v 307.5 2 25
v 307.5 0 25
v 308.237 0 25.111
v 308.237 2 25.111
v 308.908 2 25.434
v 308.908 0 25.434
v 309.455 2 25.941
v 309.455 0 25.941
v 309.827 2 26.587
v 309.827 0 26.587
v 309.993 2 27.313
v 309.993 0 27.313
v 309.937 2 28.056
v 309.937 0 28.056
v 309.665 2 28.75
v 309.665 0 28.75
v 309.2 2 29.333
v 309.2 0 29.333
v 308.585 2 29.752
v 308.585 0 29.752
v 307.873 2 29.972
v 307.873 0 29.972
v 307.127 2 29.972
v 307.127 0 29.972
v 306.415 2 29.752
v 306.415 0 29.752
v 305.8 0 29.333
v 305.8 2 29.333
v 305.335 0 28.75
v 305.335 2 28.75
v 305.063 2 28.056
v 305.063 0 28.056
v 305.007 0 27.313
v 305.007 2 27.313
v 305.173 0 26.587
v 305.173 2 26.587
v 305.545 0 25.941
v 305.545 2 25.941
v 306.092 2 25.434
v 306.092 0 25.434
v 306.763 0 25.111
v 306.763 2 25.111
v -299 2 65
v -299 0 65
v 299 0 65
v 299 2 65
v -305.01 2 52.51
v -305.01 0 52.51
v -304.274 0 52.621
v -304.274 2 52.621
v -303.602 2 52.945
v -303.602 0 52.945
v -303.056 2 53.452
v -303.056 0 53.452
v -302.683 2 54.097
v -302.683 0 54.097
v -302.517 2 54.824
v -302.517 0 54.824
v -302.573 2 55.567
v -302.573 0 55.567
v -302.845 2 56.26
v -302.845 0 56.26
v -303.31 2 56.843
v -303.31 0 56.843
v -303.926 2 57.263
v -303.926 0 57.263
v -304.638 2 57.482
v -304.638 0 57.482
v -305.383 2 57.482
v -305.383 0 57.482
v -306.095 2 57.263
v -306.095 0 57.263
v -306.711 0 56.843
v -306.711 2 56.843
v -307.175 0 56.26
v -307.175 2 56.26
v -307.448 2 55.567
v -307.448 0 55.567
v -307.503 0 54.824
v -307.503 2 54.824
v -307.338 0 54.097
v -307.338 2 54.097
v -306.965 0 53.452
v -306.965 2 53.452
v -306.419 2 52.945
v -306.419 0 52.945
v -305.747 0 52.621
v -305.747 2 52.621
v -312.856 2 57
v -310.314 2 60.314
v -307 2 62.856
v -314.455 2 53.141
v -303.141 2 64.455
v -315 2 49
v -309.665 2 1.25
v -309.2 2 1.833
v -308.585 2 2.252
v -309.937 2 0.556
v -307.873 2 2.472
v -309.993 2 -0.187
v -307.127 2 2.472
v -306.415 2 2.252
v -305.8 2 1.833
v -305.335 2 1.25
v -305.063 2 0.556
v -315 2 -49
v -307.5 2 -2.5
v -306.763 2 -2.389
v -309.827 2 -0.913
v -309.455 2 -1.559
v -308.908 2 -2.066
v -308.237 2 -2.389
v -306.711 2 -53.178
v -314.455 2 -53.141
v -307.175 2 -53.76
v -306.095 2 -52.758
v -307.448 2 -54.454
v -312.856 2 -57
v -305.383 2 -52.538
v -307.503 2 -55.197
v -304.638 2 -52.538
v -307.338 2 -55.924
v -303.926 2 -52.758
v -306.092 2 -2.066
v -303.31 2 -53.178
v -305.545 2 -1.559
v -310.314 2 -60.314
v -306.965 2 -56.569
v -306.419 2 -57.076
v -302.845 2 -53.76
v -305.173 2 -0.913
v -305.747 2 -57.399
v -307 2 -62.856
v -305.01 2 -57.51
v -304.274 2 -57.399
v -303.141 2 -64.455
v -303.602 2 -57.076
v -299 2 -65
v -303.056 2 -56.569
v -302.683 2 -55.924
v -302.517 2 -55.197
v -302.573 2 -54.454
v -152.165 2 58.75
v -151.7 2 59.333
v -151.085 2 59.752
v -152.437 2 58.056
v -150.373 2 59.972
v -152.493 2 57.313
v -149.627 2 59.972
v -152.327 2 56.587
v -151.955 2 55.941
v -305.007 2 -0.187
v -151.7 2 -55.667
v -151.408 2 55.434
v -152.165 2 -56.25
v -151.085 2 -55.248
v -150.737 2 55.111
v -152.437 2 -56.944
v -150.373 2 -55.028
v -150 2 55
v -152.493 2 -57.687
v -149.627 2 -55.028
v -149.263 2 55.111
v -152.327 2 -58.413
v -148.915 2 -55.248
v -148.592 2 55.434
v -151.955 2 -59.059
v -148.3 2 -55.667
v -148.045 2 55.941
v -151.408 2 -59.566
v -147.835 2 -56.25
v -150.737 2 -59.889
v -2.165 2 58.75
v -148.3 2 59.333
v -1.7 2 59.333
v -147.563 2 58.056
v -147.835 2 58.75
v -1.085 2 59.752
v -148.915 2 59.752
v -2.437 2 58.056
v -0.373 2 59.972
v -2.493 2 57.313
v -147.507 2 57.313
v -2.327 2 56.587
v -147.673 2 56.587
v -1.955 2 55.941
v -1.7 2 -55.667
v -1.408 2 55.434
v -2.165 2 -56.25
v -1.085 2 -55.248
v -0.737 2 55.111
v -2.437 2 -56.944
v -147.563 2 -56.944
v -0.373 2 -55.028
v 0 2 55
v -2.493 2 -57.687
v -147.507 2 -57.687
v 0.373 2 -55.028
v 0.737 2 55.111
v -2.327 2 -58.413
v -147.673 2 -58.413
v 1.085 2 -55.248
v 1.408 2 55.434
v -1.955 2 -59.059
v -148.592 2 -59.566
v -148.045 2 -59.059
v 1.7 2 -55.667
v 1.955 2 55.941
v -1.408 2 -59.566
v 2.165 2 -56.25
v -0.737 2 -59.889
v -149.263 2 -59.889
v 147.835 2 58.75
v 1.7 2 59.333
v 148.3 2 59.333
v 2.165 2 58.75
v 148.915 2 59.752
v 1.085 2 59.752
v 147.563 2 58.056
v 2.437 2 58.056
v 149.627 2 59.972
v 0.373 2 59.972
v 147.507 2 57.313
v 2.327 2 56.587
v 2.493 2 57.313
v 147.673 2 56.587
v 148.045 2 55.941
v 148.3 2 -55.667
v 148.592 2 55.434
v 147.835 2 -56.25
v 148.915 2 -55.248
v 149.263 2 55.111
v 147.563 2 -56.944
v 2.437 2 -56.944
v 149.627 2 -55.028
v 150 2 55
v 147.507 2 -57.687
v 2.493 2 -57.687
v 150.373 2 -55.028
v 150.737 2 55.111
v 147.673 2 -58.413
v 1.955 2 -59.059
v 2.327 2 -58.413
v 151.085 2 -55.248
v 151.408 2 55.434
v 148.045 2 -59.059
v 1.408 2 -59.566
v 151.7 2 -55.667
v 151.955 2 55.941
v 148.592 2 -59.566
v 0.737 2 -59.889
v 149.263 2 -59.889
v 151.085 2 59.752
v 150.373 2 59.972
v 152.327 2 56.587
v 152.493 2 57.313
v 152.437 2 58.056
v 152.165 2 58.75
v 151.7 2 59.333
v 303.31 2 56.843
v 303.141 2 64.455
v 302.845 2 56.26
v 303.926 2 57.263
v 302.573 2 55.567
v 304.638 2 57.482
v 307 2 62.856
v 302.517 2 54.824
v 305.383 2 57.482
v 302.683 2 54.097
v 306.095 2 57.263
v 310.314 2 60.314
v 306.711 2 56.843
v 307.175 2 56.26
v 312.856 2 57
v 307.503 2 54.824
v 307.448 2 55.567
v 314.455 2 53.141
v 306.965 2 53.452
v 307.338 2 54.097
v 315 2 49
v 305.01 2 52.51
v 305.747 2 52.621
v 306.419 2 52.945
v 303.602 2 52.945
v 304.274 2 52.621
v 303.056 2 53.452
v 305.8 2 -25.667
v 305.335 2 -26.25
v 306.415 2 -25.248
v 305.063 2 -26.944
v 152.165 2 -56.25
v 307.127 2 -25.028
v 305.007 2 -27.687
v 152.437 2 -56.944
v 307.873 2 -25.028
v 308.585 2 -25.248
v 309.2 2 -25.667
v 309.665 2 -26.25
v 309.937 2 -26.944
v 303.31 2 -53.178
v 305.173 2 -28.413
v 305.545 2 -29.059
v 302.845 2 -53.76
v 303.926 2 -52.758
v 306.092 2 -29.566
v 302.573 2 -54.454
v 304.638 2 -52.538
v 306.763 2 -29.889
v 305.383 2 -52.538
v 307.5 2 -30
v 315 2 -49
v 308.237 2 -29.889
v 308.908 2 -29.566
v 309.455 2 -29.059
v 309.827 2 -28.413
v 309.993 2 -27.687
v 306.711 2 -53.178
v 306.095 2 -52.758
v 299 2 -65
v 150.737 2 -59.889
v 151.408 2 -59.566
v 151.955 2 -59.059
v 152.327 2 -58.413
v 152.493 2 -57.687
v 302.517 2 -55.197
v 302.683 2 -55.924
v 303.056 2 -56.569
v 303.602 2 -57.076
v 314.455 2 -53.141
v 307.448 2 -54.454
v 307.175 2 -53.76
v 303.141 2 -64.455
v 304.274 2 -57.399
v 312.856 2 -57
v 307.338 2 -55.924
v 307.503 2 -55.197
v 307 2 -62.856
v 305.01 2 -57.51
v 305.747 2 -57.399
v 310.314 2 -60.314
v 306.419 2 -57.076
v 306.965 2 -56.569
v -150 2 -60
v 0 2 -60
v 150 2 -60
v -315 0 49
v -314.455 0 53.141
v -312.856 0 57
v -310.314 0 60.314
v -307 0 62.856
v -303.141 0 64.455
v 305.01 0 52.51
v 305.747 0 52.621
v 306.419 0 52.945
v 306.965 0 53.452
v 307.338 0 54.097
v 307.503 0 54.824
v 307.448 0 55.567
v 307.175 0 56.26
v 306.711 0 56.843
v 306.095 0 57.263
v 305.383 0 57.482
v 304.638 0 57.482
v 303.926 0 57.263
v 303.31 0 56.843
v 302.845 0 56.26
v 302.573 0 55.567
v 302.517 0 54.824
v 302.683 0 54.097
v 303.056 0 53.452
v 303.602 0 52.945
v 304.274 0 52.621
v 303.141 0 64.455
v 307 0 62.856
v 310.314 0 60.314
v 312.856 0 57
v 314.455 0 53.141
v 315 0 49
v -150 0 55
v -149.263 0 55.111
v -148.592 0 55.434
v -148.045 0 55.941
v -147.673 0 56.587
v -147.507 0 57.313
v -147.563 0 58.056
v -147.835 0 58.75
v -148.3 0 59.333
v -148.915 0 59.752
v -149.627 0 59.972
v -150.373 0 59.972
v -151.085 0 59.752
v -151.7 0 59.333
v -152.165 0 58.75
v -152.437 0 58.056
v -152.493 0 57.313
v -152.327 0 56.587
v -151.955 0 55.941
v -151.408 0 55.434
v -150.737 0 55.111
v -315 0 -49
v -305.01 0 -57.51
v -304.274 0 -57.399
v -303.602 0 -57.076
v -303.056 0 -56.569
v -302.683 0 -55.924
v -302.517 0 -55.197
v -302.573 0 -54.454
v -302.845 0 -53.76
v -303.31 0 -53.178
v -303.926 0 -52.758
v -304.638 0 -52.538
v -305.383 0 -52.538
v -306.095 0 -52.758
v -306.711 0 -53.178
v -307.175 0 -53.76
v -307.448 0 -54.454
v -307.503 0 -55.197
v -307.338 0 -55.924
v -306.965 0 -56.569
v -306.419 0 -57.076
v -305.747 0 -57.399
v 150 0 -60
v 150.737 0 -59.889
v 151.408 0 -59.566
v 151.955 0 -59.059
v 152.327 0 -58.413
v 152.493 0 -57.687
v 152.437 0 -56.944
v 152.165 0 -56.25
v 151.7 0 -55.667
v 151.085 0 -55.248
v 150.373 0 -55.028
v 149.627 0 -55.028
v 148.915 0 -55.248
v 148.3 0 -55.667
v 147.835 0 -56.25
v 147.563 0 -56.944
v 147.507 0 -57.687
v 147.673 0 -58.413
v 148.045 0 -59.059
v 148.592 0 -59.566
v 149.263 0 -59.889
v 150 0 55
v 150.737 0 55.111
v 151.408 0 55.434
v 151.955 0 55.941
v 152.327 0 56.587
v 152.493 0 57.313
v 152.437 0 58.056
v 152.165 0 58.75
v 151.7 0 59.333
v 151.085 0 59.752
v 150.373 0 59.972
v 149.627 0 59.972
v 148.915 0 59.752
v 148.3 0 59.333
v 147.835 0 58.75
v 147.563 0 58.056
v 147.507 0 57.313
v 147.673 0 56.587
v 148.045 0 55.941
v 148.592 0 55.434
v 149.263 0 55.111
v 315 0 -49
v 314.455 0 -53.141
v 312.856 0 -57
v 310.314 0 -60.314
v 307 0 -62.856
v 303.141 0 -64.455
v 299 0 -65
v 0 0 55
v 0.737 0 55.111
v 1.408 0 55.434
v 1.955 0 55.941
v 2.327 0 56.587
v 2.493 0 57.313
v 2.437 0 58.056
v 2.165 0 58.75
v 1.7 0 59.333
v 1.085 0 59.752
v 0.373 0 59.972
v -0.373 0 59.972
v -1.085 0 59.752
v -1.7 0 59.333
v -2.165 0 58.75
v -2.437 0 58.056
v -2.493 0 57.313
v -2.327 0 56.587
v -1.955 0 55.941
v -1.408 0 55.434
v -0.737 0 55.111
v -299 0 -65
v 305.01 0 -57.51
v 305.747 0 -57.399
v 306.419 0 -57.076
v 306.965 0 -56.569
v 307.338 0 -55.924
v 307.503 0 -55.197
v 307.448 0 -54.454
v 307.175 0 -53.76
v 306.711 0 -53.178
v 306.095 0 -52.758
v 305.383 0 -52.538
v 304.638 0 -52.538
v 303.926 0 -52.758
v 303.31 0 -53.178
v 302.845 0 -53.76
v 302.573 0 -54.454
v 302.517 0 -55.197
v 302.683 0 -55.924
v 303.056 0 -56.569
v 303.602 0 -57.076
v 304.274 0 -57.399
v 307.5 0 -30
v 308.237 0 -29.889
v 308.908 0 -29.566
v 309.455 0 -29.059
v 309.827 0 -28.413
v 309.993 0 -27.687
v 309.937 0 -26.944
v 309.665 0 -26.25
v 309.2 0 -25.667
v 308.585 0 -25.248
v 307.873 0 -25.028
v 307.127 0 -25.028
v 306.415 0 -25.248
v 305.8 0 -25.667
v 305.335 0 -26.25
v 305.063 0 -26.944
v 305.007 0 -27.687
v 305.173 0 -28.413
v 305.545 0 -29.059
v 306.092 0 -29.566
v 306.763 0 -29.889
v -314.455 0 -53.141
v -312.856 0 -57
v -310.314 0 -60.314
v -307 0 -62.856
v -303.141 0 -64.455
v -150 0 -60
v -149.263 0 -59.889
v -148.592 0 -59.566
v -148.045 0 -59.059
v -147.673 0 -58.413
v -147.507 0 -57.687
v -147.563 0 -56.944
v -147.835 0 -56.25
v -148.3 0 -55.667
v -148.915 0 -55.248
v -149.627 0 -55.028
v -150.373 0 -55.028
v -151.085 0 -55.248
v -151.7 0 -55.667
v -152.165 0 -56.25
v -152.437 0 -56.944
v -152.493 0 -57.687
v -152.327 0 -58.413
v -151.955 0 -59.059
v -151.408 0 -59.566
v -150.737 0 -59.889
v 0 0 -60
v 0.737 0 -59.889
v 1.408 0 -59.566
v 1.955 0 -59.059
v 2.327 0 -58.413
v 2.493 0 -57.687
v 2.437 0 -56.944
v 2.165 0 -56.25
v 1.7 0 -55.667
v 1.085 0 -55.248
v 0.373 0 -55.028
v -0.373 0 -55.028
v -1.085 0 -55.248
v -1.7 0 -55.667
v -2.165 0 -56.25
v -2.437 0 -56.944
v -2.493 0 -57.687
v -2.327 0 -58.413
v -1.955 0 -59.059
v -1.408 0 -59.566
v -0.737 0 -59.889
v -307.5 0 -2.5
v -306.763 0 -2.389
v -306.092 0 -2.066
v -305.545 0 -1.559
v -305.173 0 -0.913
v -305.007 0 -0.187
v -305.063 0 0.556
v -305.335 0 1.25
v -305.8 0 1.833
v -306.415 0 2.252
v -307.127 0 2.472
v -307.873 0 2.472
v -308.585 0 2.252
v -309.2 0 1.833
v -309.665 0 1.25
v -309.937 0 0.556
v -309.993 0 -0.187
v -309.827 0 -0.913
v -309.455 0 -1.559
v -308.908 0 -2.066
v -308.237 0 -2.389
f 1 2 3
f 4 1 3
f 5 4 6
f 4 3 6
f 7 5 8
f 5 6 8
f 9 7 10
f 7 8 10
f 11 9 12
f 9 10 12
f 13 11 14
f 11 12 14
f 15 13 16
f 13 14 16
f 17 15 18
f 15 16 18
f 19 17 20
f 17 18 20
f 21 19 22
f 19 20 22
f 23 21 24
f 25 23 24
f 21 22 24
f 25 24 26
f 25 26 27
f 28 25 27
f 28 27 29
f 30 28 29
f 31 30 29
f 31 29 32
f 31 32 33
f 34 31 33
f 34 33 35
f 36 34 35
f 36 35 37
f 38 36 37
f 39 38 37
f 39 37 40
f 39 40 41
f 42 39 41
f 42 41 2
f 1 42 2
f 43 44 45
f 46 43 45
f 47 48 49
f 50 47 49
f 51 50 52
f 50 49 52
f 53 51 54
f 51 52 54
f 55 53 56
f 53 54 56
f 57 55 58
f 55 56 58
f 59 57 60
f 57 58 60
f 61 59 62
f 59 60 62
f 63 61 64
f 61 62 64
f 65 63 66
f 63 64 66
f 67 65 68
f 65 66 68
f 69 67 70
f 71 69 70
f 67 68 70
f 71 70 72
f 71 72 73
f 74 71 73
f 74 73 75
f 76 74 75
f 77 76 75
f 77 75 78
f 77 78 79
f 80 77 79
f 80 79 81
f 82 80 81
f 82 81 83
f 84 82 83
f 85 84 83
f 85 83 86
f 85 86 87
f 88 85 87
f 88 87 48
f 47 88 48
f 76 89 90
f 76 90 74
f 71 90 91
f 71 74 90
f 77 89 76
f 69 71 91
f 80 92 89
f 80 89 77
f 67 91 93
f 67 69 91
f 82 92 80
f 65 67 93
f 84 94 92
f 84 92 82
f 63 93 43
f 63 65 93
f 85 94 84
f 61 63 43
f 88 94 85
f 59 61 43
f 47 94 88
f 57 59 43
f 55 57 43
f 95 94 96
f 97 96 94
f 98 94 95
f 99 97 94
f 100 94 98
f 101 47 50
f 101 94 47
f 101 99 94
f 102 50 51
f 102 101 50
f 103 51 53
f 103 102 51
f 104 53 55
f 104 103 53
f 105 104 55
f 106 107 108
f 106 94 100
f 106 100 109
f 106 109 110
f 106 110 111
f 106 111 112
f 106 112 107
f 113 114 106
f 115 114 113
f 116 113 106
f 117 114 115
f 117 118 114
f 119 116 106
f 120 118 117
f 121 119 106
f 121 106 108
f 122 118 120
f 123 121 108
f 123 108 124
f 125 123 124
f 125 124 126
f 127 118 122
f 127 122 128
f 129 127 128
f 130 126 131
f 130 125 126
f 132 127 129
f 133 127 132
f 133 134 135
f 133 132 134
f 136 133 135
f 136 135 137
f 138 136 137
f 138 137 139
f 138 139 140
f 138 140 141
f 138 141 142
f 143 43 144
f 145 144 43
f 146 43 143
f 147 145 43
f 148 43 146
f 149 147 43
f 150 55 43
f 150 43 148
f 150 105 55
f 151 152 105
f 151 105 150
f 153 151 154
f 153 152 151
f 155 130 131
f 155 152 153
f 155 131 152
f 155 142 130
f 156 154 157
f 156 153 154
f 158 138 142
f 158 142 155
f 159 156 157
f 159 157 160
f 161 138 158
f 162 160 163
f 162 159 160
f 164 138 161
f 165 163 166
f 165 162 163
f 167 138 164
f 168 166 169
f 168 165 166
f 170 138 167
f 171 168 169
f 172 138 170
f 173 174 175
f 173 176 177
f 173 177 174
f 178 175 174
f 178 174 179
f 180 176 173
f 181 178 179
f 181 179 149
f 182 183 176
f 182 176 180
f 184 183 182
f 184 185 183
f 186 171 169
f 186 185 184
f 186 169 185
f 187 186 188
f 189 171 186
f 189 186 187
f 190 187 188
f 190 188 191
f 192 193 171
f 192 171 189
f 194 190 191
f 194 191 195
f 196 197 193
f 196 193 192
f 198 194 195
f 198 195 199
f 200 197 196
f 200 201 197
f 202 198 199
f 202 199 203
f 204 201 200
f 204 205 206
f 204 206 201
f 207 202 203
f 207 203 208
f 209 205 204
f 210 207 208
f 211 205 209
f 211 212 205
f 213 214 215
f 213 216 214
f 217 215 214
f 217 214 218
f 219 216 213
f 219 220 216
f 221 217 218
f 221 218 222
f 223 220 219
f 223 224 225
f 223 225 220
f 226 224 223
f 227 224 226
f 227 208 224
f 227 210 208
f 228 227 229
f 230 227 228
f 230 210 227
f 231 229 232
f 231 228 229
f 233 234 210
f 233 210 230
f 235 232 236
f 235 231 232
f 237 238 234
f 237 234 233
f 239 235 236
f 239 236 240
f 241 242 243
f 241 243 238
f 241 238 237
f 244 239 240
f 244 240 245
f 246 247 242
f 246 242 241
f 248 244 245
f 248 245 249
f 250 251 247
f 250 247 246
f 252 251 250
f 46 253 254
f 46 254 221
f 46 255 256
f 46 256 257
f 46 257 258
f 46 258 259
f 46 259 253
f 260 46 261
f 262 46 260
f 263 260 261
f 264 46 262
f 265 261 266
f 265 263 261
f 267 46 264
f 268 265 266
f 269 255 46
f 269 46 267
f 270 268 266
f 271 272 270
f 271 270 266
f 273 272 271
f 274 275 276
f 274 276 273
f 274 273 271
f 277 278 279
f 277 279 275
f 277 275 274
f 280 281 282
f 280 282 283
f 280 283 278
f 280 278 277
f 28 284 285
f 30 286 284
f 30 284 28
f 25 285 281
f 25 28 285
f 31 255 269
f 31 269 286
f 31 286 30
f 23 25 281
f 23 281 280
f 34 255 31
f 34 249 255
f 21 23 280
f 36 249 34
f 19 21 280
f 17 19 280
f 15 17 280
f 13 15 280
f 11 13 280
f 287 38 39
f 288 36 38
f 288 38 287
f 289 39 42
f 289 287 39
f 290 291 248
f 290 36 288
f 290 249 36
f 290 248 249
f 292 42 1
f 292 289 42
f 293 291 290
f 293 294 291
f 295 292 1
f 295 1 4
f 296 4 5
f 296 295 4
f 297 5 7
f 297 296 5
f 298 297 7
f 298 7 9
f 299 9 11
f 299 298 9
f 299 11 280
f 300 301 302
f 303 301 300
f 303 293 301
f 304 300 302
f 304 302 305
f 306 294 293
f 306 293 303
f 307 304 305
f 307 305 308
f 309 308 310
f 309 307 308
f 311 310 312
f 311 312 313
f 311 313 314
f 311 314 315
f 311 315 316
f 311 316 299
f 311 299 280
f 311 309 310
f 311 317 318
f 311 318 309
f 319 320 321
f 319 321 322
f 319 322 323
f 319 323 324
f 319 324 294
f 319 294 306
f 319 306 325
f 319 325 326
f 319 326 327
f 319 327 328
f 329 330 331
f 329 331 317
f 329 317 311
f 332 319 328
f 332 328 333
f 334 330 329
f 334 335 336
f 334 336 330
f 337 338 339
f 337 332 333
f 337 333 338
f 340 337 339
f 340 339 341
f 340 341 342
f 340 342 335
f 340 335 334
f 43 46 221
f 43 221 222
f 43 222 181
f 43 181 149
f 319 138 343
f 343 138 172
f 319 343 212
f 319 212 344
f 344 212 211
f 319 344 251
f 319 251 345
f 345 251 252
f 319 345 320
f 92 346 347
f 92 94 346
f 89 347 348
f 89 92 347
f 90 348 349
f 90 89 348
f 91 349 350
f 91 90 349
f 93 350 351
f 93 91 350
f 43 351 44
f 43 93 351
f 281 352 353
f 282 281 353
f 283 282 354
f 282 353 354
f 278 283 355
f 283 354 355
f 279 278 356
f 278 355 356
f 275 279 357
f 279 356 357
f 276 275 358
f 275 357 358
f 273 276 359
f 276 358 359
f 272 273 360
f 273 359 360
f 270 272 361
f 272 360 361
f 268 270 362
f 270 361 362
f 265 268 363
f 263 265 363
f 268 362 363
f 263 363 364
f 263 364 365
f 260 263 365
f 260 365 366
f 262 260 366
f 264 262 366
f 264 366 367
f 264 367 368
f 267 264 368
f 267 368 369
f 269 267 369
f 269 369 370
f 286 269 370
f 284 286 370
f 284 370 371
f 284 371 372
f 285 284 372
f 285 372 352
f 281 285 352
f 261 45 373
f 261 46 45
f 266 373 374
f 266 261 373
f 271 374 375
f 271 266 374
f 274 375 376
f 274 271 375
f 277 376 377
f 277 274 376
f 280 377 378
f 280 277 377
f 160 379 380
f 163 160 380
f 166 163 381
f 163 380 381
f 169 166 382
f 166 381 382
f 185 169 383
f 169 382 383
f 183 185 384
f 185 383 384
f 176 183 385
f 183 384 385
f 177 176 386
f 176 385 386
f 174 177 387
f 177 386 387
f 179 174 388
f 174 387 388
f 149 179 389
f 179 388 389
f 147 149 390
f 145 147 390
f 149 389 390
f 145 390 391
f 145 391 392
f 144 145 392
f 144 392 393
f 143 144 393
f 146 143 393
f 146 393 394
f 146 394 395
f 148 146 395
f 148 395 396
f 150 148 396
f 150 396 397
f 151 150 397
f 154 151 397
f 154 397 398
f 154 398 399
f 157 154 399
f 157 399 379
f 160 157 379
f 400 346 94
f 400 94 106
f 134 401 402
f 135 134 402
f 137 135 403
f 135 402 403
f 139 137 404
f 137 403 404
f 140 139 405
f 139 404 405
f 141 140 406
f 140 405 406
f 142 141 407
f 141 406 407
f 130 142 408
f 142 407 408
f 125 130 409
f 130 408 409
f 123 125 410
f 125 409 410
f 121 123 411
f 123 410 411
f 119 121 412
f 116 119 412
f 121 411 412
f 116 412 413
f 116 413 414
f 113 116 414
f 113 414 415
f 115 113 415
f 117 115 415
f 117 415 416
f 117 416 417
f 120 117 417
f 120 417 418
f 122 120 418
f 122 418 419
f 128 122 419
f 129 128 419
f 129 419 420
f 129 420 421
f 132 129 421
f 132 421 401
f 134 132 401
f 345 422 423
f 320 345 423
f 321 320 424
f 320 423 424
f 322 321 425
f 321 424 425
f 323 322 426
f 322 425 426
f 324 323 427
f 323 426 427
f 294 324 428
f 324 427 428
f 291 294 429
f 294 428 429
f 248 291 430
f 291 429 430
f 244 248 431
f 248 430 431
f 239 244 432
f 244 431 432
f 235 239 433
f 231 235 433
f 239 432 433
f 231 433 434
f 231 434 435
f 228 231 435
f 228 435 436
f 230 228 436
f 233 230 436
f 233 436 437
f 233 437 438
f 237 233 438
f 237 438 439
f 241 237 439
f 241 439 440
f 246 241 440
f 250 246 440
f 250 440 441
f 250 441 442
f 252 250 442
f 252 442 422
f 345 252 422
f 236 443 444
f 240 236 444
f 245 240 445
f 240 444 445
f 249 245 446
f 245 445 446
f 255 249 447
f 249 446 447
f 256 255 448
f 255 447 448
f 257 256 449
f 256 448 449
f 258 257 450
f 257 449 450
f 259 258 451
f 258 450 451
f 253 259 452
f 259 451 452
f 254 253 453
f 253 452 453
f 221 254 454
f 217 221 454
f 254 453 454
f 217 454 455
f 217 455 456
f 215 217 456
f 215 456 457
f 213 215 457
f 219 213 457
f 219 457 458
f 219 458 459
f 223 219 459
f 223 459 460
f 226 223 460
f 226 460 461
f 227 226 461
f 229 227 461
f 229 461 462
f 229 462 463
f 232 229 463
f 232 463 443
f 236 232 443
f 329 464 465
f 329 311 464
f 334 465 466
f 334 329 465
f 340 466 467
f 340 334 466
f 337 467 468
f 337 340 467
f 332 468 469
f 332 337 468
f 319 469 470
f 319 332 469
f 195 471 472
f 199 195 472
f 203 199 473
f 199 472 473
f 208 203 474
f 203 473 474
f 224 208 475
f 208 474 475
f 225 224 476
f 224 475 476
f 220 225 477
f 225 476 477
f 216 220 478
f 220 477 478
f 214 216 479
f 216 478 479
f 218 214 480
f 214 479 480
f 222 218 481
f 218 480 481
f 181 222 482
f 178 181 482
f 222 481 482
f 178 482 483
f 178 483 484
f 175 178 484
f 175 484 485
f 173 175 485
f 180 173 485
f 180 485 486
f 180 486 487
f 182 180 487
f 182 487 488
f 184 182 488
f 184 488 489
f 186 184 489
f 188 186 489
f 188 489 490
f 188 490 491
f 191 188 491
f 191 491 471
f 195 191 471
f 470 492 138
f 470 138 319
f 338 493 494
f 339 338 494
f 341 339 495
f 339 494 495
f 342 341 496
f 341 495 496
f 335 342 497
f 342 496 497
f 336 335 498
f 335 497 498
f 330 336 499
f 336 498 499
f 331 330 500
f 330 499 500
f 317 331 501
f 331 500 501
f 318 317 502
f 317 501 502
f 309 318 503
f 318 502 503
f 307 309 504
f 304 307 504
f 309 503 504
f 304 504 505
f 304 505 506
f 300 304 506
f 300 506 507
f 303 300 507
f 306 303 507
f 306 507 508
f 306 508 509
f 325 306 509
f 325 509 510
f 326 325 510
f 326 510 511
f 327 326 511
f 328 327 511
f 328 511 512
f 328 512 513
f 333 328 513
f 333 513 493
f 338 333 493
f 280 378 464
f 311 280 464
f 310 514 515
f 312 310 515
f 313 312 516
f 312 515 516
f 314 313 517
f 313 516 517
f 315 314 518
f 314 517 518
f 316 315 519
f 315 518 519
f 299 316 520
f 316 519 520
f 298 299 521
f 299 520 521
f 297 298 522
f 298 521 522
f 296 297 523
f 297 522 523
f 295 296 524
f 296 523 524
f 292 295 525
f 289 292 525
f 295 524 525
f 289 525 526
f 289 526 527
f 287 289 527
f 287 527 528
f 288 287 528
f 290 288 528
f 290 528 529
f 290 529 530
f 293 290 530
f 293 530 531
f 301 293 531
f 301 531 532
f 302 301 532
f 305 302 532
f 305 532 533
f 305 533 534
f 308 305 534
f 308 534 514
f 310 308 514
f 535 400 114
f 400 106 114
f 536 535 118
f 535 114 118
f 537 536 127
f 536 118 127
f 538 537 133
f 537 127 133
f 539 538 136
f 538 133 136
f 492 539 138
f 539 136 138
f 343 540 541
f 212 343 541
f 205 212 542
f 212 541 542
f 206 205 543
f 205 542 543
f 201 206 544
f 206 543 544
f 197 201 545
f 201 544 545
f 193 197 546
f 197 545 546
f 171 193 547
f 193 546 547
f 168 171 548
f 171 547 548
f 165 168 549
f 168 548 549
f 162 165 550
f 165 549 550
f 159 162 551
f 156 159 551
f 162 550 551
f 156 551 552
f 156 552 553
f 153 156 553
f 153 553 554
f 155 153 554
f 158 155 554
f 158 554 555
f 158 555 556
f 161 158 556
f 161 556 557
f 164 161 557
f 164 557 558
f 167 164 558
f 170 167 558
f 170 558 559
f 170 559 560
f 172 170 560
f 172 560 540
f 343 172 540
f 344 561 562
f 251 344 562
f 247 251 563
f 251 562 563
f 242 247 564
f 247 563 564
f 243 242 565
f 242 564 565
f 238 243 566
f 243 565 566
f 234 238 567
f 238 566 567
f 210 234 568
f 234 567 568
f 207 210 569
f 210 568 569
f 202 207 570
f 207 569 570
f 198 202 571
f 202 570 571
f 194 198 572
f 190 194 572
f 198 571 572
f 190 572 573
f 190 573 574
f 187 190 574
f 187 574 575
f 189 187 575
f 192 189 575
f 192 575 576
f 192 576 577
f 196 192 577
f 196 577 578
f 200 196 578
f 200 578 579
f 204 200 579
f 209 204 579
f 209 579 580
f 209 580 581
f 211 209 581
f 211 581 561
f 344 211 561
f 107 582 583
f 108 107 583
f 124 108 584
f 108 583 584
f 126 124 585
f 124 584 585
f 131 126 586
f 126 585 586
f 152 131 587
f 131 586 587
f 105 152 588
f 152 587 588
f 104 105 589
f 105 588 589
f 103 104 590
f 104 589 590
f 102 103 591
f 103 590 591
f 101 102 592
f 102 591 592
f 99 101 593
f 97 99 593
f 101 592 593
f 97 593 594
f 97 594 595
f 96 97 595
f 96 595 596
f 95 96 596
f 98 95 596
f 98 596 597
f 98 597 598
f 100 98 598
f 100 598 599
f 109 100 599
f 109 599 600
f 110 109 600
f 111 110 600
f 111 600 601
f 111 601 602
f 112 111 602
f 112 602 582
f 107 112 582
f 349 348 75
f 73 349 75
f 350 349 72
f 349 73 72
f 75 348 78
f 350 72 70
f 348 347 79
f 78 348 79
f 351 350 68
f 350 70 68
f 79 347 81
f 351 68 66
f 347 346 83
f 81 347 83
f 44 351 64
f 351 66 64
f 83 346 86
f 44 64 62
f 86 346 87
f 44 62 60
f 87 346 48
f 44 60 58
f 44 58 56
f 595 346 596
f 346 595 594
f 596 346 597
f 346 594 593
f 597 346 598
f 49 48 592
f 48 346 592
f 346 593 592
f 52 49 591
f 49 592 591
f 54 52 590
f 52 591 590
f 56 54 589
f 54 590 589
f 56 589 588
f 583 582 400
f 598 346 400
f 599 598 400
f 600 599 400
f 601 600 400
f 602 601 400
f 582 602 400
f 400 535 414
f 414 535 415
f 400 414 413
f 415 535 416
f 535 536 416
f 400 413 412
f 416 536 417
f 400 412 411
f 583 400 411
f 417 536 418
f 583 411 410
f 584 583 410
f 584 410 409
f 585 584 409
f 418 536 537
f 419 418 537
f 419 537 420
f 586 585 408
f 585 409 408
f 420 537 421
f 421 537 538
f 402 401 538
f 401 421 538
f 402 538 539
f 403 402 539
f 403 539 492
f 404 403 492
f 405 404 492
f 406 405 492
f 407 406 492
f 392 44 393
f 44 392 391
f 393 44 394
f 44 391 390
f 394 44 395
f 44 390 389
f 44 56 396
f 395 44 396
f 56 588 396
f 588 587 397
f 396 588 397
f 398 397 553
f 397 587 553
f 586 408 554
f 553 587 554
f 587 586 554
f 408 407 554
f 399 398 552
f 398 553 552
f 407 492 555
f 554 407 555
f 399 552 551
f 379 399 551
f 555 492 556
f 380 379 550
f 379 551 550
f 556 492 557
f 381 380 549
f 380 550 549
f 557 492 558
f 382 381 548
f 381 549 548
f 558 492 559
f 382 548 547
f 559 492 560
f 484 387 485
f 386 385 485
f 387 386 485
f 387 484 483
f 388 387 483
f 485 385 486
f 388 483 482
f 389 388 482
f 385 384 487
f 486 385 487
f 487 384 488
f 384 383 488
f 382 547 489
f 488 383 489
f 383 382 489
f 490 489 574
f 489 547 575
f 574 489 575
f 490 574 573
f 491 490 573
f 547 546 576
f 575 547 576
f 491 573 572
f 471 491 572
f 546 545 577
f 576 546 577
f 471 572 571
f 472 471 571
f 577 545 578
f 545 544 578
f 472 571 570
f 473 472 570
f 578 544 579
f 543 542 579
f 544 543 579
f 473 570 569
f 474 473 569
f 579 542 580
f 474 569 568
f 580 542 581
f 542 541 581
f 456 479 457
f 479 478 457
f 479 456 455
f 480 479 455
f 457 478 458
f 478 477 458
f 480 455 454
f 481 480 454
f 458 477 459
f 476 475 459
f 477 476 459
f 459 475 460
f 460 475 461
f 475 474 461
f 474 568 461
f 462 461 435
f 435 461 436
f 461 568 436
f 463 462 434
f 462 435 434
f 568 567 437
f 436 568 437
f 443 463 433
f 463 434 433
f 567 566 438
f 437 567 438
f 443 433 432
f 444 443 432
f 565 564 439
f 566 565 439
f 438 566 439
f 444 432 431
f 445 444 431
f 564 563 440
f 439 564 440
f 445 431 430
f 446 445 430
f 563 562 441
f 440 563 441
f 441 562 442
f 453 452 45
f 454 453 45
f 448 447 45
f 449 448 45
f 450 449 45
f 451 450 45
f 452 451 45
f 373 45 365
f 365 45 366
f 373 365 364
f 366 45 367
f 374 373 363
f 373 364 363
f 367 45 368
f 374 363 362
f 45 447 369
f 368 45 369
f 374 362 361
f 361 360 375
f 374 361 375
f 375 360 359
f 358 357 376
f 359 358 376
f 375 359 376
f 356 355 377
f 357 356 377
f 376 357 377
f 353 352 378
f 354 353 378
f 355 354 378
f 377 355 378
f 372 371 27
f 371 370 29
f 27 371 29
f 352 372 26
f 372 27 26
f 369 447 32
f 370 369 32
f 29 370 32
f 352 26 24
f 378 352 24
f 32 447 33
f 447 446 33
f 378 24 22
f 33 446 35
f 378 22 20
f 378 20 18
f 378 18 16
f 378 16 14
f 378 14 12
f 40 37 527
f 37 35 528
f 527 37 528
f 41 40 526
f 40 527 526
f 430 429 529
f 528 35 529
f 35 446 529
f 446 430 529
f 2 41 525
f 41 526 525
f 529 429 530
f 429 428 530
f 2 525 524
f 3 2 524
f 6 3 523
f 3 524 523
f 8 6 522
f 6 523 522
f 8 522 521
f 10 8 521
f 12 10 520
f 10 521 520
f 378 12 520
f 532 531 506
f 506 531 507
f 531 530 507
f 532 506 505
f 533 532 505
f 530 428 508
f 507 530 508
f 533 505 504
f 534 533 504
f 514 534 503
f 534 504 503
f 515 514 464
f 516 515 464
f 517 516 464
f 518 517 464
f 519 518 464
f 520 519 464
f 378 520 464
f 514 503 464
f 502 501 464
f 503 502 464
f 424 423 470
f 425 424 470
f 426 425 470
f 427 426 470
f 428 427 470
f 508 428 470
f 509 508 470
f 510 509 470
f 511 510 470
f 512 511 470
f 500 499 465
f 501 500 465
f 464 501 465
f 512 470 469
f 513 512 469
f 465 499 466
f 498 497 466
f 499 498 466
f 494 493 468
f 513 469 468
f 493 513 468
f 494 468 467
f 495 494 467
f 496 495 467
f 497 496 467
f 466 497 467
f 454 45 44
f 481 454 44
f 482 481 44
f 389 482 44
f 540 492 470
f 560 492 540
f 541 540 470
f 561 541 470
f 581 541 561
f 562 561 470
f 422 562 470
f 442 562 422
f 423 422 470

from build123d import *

# Parameters (mm, degrees)
SKETCH1_W                = 630
SKETCH1_H                = 130
BOSS_EXTRUDE1_DEPTH      = 2
FILLET1_R                = 16
F_5_0_5_DIAMETER_HOLE1_D = 5


with BuildPart() as part:
    # Sketch1 → Boss-Extrude1 (new body)
    with BuildSketch(Plane(origin=(0, 0, 0), x_dir=(1, 0, 0), z_dir=(0, 1, 0))):
        Rectangle(SKETCH1_W, SKETCH1_H)
    extrude(amount=BOSS_EXTRUDE1_DEPTH)

    # Fillet1
    fillet1_edges = [part.edges().sort_by_distance(p)[0] for p in [
        (315, 1, 65),
        (-315, 1, 65),
        (-315, 1, -65),
        (315, 1, -65),
    ]]
    fillet(fillet1_edges, radius=FILLET1_R)

    # Ø5.0 (5) Diameter Hole1 (through all)
    with Locations(Plane(origin=(-305.01040764, 2, -55.01040764), x_dir=(0, 0, 1), z_dir=(0, 1, 0))):
        with Locations((0, 0), (-2.48959236, 155.01040764), (55.01040764, -2.48959236), (110.02081528, 0), (112.51040764, 155.01040764), (-2.48959236, 305.01040764), (112.51040764, 305.01040764), (112.51040764, 455.01040764), (-2.48959236, 455.01040764), (0, 610.02081528), (110.02081528, 610.02081528), (27.51040764, 612.51040764), (82.51040764, 612.51040764)):
            Hole(F_5_0_5_DIAMETER_HOLE1_D / 2)


solid = part.part
